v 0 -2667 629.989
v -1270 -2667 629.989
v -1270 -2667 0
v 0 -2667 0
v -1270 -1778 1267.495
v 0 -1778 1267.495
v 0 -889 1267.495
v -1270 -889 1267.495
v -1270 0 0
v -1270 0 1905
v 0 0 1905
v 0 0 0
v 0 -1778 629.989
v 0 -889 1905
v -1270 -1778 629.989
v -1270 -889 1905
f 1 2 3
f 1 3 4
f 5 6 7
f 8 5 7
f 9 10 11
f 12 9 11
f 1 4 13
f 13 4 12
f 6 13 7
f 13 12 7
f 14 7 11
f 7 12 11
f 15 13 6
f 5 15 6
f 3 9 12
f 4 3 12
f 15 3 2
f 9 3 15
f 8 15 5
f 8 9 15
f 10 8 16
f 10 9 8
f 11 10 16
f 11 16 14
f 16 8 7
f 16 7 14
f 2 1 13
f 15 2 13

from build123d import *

# Parameters (mm, degrees)
F0_W     = 1270
F0_H     = 1905
F1_DEPTH = 2667
F2_W     = 889
F2_H     = 635
F3_DEPTH = 1882.14
F4_W     = 889
F4_H     = 640.0108528137
F5_DEPTH = 2161.54
F7_W     = 889
F7_H     = 637.5054264069
F8_DEPTH = 2392.68


with BuildPart() as f1:
    # F0 (on Front) → F1 (new body)
    with BuildSketch(Plane.XZ):
        with Locations((-635, 952.5)):
            Rectangle(F0_W, F0_H)
    extrude(amount=F1_DEPTH)

    # F2 (on face) → F3 (cut)
    with BuildSketch(Plane.YZ):
        with Locations((-2222.5, 947.4891471863)):
            Rectangle(F2_W, F2_H)
    extrude(amount=-F3_DEPTH, mode=Mode.SUBTRACT)

    # F4 (on face) → F5 (cut)
    with BuildSketch(Plane.YZ):
        with Locations((-2222.5, 1584.9945735931)):
            Rectangle(F4_W, F4_H)
    extrude(amount=-F5_DEPTH, mode=Mode.SUBTRACT)

    # F7 (on face) → F8 (cut)
    with BuildSketch(Plane.YZ):
        with Locations((-1333.5, 1586.2472867966)):
            Rectangle(F7_W, F7_H)
    extrude(amount=-F8_DEPTH, mode=Mode.SUBTRACT)


solid = f1.part
